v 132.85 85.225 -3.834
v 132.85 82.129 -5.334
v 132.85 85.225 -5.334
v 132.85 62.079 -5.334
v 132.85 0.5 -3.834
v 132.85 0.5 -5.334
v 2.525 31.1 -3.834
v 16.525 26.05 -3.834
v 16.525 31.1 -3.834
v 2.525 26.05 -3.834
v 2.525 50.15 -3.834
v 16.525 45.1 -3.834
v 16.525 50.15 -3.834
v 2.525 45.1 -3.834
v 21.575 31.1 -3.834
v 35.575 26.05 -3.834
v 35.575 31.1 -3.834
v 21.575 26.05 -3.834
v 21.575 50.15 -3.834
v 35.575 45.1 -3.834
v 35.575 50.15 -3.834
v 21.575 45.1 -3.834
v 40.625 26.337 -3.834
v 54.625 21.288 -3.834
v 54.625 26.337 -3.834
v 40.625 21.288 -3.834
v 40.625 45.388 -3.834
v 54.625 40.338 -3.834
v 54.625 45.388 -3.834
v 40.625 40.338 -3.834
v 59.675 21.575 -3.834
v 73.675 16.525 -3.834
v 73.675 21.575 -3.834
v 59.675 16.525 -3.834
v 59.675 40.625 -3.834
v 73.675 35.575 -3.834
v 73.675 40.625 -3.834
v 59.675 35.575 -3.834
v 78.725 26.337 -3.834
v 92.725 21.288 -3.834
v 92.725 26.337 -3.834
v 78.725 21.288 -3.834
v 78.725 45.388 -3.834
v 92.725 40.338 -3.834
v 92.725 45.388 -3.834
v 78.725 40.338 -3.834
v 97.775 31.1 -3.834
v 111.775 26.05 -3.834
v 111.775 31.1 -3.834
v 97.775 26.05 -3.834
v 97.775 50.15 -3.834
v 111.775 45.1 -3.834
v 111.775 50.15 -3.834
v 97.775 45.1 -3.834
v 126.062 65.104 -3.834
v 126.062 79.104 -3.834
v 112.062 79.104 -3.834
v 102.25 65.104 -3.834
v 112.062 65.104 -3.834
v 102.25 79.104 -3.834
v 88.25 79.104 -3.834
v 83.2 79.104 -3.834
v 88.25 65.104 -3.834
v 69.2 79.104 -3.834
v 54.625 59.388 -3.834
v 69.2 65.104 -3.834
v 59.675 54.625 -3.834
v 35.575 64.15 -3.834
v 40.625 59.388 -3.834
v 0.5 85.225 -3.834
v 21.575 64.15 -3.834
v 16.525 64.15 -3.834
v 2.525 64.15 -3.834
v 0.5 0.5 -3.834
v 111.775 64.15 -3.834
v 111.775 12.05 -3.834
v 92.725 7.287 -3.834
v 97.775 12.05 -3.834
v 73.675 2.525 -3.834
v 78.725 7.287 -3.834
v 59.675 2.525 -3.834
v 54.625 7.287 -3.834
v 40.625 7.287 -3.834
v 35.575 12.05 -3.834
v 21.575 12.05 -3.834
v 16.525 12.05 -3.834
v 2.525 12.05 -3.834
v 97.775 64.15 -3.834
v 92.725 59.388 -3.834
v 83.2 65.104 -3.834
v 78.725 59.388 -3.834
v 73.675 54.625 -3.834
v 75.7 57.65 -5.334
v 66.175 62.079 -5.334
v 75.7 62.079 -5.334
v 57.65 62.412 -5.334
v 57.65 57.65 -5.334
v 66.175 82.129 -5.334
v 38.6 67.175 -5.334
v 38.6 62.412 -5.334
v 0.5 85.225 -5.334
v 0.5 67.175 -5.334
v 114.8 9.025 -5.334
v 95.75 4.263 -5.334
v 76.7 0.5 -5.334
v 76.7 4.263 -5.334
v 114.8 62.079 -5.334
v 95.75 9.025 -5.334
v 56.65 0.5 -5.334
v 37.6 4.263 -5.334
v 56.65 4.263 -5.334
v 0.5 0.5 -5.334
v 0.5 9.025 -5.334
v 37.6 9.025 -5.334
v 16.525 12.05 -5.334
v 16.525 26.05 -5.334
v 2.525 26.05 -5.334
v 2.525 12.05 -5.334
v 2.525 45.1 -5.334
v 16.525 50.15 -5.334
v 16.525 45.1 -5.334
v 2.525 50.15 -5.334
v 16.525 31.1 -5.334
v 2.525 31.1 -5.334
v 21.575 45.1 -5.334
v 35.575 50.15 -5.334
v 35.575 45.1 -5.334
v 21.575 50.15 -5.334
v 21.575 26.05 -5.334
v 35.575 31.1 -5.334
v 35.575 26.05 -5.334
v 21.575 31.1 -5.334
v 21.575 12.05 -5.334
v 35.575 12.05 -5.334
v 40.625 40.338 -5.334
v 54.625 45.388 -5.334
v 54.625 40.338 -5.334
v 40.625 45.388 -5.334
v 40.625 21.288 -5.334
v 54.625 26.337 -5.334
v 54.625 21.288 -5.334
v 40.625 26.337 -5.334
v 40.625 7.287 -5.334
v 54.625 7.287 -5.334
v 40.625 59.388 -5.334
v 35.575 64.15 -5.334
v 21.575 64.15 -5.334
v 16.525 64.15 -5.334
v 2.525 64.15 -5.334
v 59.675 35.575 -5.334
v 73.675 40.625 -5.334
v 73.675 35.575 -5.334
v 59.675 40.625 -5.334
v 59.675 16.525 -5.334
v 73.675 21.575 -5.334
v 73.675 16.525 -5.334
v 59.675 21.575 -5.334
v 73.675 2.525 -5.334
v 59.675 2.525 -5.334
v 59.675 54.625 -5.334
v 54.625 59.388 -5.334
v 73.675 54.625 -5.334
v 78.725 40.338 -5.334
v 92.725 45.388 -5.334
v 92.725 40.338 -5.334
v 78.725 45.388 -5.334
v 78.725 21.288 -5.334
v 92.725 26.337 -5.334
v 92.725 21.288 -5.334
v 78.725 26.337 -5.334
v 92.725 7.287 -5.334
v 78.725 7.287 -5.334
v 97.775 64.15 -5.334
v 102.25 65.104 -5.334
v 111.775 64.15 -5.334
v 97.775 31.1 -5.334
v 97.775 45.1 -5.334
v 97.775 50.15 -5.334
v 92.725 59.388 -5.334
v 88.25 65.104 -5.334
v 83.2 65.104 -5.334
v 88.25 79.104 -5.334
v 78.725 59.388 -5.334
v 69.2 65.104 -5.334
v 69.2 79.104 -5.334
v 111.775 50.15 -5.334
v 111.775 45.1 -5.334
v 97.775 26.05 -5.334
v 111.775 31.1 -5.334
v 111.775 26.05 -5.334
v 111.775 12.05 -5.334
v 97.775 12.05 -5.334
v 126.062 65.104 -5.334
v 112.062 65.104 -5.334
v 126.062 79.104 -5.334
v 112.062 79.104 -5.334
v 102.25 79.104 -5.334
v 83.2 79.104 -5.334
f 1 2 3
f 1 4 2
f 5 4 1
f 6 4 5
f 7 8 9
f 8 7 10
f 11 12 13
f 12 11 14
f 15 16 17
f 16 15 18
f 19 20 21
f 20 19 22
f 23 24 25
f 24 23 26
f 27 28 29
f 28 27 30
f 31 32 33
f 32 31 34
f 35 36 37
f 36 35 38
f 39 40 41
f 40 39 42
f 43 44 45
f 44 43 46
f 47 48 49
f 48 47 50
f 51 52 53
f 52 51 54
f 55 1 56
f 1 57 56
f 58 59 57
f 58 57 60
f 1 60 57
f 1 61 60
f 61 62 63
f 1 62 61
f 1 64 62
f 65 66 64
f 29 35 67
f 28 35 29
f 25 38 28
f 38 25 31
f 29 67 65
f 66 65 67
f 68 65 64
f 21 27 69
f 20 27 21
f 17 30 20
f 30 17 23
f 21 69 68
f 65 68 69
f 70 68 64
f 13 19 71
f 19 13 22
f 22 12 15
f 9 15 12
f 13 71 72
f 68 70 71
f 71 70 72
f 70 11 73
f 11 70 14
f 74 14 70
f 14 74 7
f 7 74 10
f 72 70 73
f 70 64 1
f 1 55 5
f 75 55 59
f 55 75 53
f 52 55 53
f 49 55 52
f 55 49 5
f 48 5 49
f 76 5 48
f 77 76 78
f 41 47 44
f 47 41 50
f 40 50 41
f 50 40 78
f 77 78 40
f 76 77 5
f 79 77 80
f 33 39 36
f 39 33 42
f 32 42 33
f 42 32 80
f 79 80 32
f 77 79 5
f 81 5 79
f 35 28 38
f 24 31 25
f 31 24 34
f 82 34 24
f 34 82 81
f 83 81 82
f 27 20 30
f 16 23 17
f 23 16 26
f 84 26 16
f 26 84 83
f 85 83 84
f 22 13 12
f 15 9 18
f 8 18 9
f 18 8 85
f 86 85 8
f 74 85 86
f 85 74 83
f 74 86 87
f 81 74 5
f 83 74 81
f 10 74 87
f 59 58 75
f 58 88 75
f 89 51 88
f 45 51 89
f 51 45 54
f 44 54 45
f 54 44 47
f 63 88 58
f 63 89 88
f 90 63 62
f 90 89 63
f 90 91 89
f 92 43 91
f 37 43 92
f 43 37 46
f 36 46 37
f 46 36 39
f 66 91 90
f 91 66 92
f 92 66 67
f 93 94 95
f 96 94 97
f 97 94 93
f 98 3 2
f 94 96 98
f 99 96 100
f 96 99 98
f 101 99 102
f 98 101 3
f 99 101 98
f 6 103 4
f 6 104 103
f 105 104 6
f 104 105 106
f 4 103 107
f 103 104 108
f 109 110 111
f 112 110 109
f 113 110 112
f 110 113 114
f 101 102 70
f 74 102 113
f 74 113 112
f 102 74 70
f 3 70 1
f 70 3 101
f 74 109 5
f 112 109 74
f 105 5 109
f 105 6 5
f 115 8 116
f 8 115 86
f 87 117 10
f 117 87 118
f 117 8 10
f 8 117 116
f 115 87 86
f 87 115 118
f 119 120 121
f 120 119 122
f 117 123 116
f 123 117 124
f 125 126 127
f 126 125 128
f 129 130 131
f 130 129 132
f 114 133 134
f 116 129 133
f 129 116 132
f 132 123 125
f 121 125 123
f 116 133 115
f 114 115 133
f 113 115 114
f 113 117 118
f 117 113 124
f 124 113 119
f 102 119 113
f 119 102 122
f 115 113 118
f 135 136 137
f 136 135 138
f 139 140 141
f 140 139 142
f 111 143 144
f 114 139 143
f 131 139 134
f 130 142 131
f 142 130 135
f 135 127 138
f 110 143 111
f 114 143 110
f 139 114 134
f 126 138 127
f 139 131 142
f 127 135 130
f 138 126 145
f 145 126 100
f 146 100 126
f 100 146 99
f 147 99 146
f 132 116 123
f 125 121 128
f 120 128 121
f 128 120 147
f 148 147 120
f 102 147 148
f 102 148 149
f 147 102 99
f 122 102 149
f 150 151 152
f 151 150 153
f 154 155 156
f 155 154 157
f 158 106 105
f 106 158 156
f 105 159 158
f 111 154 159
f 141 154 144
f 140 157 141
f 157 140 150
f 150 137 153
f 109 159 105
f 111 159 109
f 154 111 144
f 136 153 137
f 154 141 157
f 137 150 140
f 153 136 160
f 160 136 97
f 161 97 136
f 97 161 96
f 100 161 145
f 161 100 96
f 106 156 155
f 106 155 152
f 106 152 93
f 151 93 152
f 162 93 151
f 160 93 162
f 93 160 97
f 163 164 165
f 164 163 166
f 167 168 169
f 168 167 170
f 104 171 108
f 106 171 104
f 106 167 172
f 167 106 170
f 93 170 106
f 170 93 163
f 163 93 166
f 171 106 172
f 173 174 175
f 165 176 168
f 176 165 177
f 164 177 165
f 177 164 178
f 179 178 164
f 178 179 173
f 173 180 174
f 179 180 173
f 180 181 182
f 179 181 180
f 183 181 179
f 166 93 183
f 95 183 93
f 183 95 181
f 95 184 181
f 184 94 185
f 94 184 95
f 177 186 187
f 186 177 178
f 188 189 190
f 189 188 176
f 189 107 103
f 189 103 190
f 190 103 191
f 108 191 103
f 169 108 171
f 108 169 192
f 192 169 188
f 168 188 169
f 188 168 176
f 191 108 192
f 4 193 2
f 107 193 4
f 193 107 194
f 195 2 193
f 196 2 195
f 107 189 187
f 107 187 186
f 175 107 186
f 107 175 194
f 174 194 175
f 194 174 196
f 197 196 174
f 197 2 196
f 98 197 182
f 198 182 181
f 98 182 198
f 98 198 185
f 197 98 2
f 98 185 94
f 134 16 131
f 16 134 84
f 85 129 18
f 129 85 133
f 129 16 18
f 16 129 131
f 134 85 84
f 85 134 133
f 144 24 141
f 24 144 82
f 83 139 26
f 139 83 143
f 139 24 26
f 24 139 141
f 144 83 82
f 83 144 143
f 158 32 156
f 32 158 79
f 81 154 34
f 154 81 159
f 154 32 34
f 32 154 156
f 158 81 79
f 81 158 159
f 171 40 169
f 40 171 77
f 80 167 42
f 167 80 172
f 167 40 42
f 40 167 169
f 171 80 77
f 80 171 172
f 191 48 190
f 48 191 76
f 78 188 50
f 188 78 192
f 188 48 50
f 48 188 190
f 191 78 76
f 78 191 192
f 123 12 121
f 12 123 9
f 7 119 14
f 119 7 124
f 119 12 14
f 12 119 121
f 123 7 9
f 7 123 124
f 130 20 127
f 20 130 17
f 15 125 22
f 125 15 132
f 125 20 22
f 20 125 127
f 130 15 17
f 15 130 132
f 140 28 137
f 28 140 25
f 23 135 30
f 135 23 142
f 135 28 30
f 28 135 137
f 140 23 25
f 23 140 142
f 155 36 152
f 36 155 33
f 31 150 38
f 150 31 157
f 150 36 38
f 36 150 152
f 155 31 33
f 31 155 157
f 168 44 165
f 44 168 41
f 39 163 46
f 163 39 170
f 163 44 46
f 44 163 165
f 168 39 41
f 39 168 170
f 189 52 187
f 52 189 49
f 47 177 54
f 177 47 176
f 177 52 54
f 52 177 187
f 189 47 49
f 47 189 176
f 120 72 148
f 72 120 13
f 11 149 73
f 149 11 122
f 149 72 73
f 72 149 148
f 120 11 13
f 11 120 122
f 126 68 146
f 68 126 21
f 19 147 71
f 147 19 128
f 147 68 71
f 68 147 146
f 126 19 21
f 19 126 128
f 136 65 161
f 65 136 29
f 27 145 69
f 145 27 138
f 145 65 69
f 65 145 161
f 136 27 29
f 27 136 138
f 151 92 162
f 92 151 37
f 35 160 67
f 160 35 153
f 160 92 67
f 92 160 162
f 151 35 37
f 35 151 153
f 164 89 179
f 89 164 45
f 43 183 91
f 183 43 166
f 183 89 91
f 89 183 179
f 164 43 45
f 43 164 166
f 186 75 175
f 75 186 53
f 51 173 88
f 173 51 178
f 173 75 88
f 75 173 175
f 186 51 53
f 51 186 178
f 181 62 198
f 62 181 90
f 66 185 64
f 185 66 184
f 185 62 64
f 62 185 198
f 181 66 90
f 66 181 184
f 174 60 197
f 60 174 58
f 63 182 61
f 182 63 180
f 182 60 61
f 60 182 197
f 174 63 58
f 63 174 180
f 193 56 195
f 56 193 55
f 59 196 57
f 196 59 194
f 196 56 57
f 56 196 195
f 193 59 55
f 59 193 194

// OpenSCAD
// file: ../lib/circuits/helpers.scad
function bu(u) = u * 2.54;

module breadboard_row(number, orientation="vertical") {
  children();
  if(number > 1) {
    if(orientation == "vertical") {
      translate([0,bu(1),0])
        breadboard_row(number-1, orientation=orientation) {
          children();
        }
    } else {
      translate([bu(1),0,0])
        breadboard_row(number-1, orientation=orientation){
          children();
        }
    }
  }
}
// file: ../lib/switches/rgb.scad
include <../variables.scad>

module rgb_row_trace_connection(width, height, xpos, ypos, rgb, connections) {
  half_width = u_mm(width)/2;
  half_height = u_mm(height)/2;
  if(connections[3] == "connect") {
    translate([1-half_width,8.875,0]){
      circle(d=0.8,$fn=40);
      offset(0.4)
        polygon(points=[[0,-0.01],[0,0.01],[u_mm(-xpos)-2, u_mm(-ypos)+0.01],[u_mm(-xpos)-2, u_mm(-ypos)-0.01]]);
    }
    translate([1-half_width,4.9,0]){
      circle(d=0.8,$fn=40);
      offset(0.4)
        polygon(points=[[0,-0.01],[0,0.01],[u_mm(-xpos)-2, u_mm(-ypos)+0.01],[u_mm(-xpos)-2, u_mm(-ypos)-0.01]]);
    }
    translate([1-half_width,3.3,0]){
      circle(d=0.8,$fn=40);
      offset(0.4)
        polygon(points=[[0,-0.01],[0,0.01],[u_mm(-xpos)-2, u_mm(-ypos)+0.01],[u_mm(-xpos)-2, u_mm(-ypos)-0.01]]);
    }
  }
  if(connections[2] == "connect") {
    translate([half_width-1,8.875,0]) {
      circle(d=0.8,$fn=40);
    }
    translate([half_width-1,4.9,0]) {
      circle(d=0.8,$fn=40);
    }
    translate([half_width-1,3.3,0]){
      circle(d=0.8,$fn=40);
    }
  }
}

module rgb_pcb_drill(width=1, height=1, rgb=true, connections=["hole","hole","hole","hole"]) {
  half_width = u_mm(width)/2;
  half_height = u_mm(height)/2;
  translate([half_width,half_height,0]) {
    if(rgb == true) {
      // LED Hole
      translate([-1.875,3.4])
        square([3.75,3]);

      // LED D
      if(connections[3] == "hole")
        translate([1.3-half_width,8,0])
          circle(d=1,$fn=40);
      if(connections[2] == "hole")
        translate([half_width-1.3,8,0])
          circle(d=1,$fn=40);

      // LED G
      if(connections[3] == "hole")
        translate([1.3-half_width,5.4,0])
          circle(d=1,$fn=40);
      if(connections[2] == "hole")
        translate([half_width-1.3,5.4,0])
          circle(d=1,$fn=40);

      // LED V
      if(connections[3] == "hole")
        translate([1.3-half_width,2.8,0])
          circle(d=1,$fn=40);
      if(connections[2] == "hole")
        translate([half_width-1.3,2.8,0])
          circle(d=1,$fn=40);
    }

    children();
  }
}

module rgb_pcb_hole_traces(width=1, height=1, rgb=true, xpos=0, ypos=0, connections=["hole","hole","hole","hole"]) {
  half_width = u_mm(width)/2;
  half_height = u_mm(height)/2;
  translate([half_width,half_height,0]) {
    if(rgb == true) {
      // LED D
      if(connections[3] == "hole")
        translate([1.3-half_width,8,0])
          circle(d=2.5,$fn=40);
      if(connections[2] == "hole")
        translate([half_width-1.3,8,0])
          circle(d=2.5,$fn=40);

      // LED G
      if(connections[3] == "hole")
        translate([1.3-half_width,5.4,0])
          circle(d=2.5,$fn=40);
      if(connections[2] == "hole")
        translate([half_width-1.3,5.4,0])
          circle(d=2.5,$fn=40);

      // LED V
      if(connections[3] == "hole")
        translate([1.3-half_width,2.8,0])
          circle(d=2.5,$fn=40);
      if(connections[2] == "hole")
        translate([half_width-1.3,2.8,0])
          circle(d=2.5,$fn=40);
    }

    children();
  }
}

module rgb_pcb_traces(width=1, height=1, rgb=true, xpos=0, ypos=0, connections=["hole","hole","hole","hole"]) {
  half_width = u_mm(width)/2;
  half_height = u_mm(height)/2;
  rgb_pcb_hole_traces(width=width, height=height, rgb=rgb, connections=connections) {
    if(rgb == true) {
      rgb_row_trace_connection(width=width, height=height, xpos=xpos, ypos=ypos, rgb=rgb, connections=connections);
      v_left = connections[3] == "none" ? 1 : half_width-5;
      // LED G
      translate([1.25,5])
        square([2,2]);
      translate([2.7,8.5,0]) {
        length = connections[2] == "none" ? 2 : half_width-3.7; 
        square([length,0.75]);
      }
      translate([2.7,6.8])
        square([0.8,2.4]);
      translate([-3.5,6.2])
        square([7,0.8]);
      translate([-3.5,6.8])
        square([0.8,2.4]);
      translate([-4-v_left,8.5,0])
        square([v_left+1,0.75]);

      // LED D
      translate([-4-v_left,4.5,0])
        square([v_left,0.8]);
      translate([-4.5,4.5,0])
        square([0.8,1.3]);
      translate([-4.5,5,0])
        square([1.3,0.8]);
      translate([2,4,0])
        square([2,0.8]);
      translate([4,4,0])
        square([0.8,1.3]);
      translate([4,4.5,0]) {
        length = connections[2] == "none" ? 0 : half_width-5; 
        square([length,0.75]);
      }
      translate([-3.375,5])
        square([2,1.1]);
      translate([1.25,3.75])
        square([2,1.1]);

      // LED V
      v_right = connections[2] == "none" ? 0 : half_width-5.25;
      translate([-4-v_left,2.9,0])
        square([v_right+v_left+8.875,0.8]);
      translate([-3.375,3.5])
        square([2,1.35]);
    }

    children();
  }
}
// file: ../lib/switches/base.scad
include <../variables.scad>
include <rgb.scad>

// ["top", "bottom", "left", "right"]

module switch_row_trace_connection(width, height, xpos, ypos, rgb, connections) {
  half_width = u_mm(width)/2;
  half_height = u_mm(height)/2;
  if(connections[3] == "connect") {
    translate([1-half_width,-5.5,0]){
      circle(d=0.8,$fn=40);
      offset(0.4)
        polygon(points=[[0,-0.01],[0,0.01],[u_mm(-xpos)-2, u_mm(-ypos)+0.01],[u_mm(-xpos)-2, u_mm(-ypos)-0.01]]);
    }
  }
  if(connections[2] == "connect") {
    translate([half_width-1,-5.5,0]) {
      circle(d=0.8,$fn=40);
    }
  }
}

module switch_column_trace_connection(width, height, xpos, ypos, rgb, connections, last_xpos=0, last_ypos=0) {
  half_width = u_mm(width)/2;
  half_height = u_mm(height)/2;
  if(connections[1] == "connect") {
    translate([-u_mm((width-1)/2)-0.9,half_height-1,0]) {
      circle(d=0.8,$fn=40);
      offset(0.4)
        polygon(points=[[0,-0.01],[0,0.01],[u_mm((width-1)/2),0.01],[u_mm((width-1)/2),-0.01]]);
    }
  }
  if(connections[0] == "connect") {
    y_off = u_mm(ypos-last_ypos);
    x_off = u_mm(last_xpos-xpos);
    translate([-0.875,-1-y_off-half_height,0]) {
      offset(0.4)
        polygon(points=[[-0.01+x_off,0],[0.01+x_off,0],[0.01,2+y_off],[-0.01,2+y_off]]);
      translate([x_off-0.01,0]) {
        offset(0.4)
          polygon(points=[[0,-0.01],[0,0.01],[u_mm((width-1)/2)+1,0.01],[u_mm((width-1)/2)+1,-0.01]]);
      }
    }
  }
}

module switch_base_pcb_drill(width=1, height=1, rgb=true, single=true, connections=["hole","hole","hole","hole"]) {
  half_width = u_mm(width)/2;
  half_height = u_mm(height)/2;
  rgb_pcb_drill(width=width, height=height, rgb=rgb, connections=connections) {
    // Row
    if(connections[2] == "hole")
      translate([half_width-1.3,-5.5,0])
        circle(d=1,$fn=40);
    if(connections[3] == "hole")
      translate([1.3-half_width,-5.5,0])
        circle(d=1,$fn=40);

    // Column
    if(connections[1] == "hole")
      translate([-1,half_height-1.25,0])
        circle(d=1,$fn=40);
    if(connections[0] == "hole")
      translate([-1,1.25-half_height,0])
        circle(d=1,$fn=40);

    children();
  }
}

module switch_base_pcb_traces(width=1, height=1, rgb=true, xpos=0, ypos=0, connections=["hole","hole","hole","hole"], last_xpos=0, last_ypos=0, single=true) {
  half_width = u_mm(width)/2;
  half_height = u_mm(height)/2;
  rgb_pcb_traces(width=width, height=height, rgb=rgb, xpos=xpos, ypos=ypos, connections=connections) {
    switch_row_trace_connection(width, height, xpos, ypos, rgb, connections);
    if(single && !rgb)
      switch_column_trace_connection(width, height, xpos, ypos, rgb, connections, last_xpos=last_xpos, last_ypos=last_ypos);

    // Row
    if(connections[2] == "hole")
      translate([half_width-1.3,-5.5,0])
        circle(d=2.5,$fn=40);
    if(connections[3] == "hole")
      translate([1.3-half_width,-5.5,0])
        circle(d=2.5,$fn=40);

    // Column
    if(connections[1] == "hole")
      translate([-1,half_height-1.25,0])
        circle(d=2.4,$fn=40);
    if(connections[0] == "hole")
      translate([-1,1.25-half_height,0])
        circle(d=2.4,$fn=40);

    children();
  }
}

module switch_base_pcb_traces_bottom(width=1, height=1, rgb=true, xpos=0, ypos=0, connections=["hole","hole","hole","hole"], last_xpos=0, last_ypos=0) {
  half_width = u_mm(width)/2;
  half_height = u_mm(height)/2;
  rgb_pcb_hole_traces(width=width, height=height, rgb=rgb, connections=connections) {
    switch_column_trace_connection(width, height, xpos, ypos, rgb, connections, last_xpos=last_xpos, last_ypos=last_ypos);

    // Row
    if(connections[2] == "hole")
      translate([half_width-1.3,-5.5,0])
        circle(d=2.5,$fn=40);
    if(connections[3] == "hole")
      translate([1.3-half_width,-5.5,0])
        circle(d=2.5,$fn=40);

    // Column
    if(connections[1] == "hole")
      translate([-1,half_height-1.25,0])
        circle(d=2.5,$fn=40);
    if(connections[0] == "hole")
      translate([-1,1.25-half_height,0])
        circle(d=2.5,$fn=40);

    children();
  }
}
// file: ../lib/switches/footprints.scad
include <../variables.scad>
include <stabilizers.scad>

module pcb_switch_outline(width=1, height=1) {
  stab_extra = width >= 2 ? 2 : 0;
  translate([0,-stab_extra])
    square([u_mm(width)+0.01, u_mm(height)+0.01+stab_extra]);
}

module pcb_switch_space_outline(width=1, height=1, style="mx", cnc=false) {
  offset = height_for_style(style);
  stab_extra = width >= 2 ? 2 : 0;
  translate([-1,-1-stab_extra,2.834-offset])
    cube([u_mm(width) + 2, u_mm(height) + 2 + stab_extra, 1.166+offset]);
  translate([u_mm(width/2),u_mm(height/2)]) {
    translate([-7.5,-7.5,1.5-offset])
      cube([15,15,5]);
    translate([-7,-7,-10])
      cube([14,14,10]);
    translate([u_mm(-width/2)-0.5,u_mm(-height/2)-0.5,-20-offset])
      cube([u_mm(width)+1,u_mm(height)+1, 20]);
  }
  translate([hole_offset(width), hole_offset(height),-10])
    stab(width);
}
// file: ../lib/switches/stabilizers.scad
module stab_hole_render(distance){
  translate([14+distance+3.375,6.99,0]) {
    circle(d=3.175, $fn=40);
    translate([0,-15.24,0])
      circle(d=4.064, $fn=40);
  }
  translate([-6.75-distance+3.375,6.99,0]) {
    circle(d=3.175, $fn=40);
    translate([0,-15.24,0])
      circle(d=4.064, $fn=40);
  }
}

module stab_holes(width) {
  if (width >= 7) {
    stab_hole_render(39.6);
  } else if (width >= 6) {
    stab_hole_render(39.6);
  } else if(width >= 2) {
    stab_hole_render(1.6);
  }
}

module stab_render(distance, cnc=false, height=5.334) {
  translate([14+distance,1.47,0]){
    // Right Side Large Hole
    cube([6.75,12.3,10]);

    // Add 1/16" corner holes for milling
    if(cnc){
      translate([0.56,0.56,0])
        cylinder(h=10,d=1.59,$fn=20);
      translate([6.75-0.56,0.56,0])
        cylinder(h=10,d=1.59,$fn=20);
      translate([0.56,12.3-0.56,0])
        cylinder(h=10,d=1.59,$fn=20);
      translate([6.75-0.56,12.3-0.56,0])
        cylinder(h=10,d=1.59,$fn=20);
    }
    translate([5.75,3.23,0]){
      // Side hole for notch
      cube([1.825,3.175,10]);
      translate([1.825,1.59,0])
        if(cnc)
          resize([1.59,3.175,10])
            cylinder(h=10,d=1.59,$fn=20);
    }
    translate([1.725,11.3,0]){
      // Top Notch
      cube([3.3,2.2,10]);
      if(cnc)
        translate([1.65,2.2,0])
          resize([3.3,1,10])
            cylinder(h=10,d=1,$fn=20);
    }
    // Thin out for clip
    translate([-1,-1,10-height+1.5])
      cube([8.75,14.3,height-1.5]);
  }
  translate([-6.75-distance,1.47,0]){
    // Left Side Large Hole
    cube([6.75,12.3,10]);
    translate([-0.825,3.23,0]){
      // Side hole for notch
      cube([1.825,3.175,10]);
      if(cnc)
        translate([0,1.59,0])
          resize([1.59,3.175,10])
            cylinder(h=10,d=1.59,$fn=20);

    }
    translate([1.725,11.3,0]){
      // Top Notch
      cube([3.3,2.2,10]);
      if(cnc)
        translate([1.65,2.2,0])
          resize([3.3,1,10])
            cylinder(h=10,d=1,$fn=20);
    }
    if(cnc){
      translate([0.56,0.56,0])
        cylinder(h=10,d=1.59,$fn=20);
      translate([6.75-0.56,0.56,0])
        cylinder(h=10,d=1.59,$fn=20);
      translate([0.56,12.3-0.56,0])
        cylinder(h=10,d=1.59,$fn=20);
      translate([6.75-0.56,12.3-0.56,0])
        cylinder(h=10,d=1.59,$fn=20);
    }
    // Thin out for clip
    translate([-1,-1,10-height+1.5])
      cube([8.75,14.3,height-1.5]);
  }
  // Center shaft for bar
  translate([-distance-2,4.7,0]){
    cube([distance*2+20,4.6,10]);
  }
}

module stab(key_width, cnc=false) {
  if (key_width >= 7) {
    stab_render(39.6, cnc=cnc);
  } else if (key_width >= 6) {
    stab_render(39.6, cnc=cnc);
  } else if(key_width >= 2) {
    stab_render(1.6, cnc=cnc);
  }
}
// file: ../lib/circuits/wire.scad
module guage(guage=12) {
  fn=20;
  if(guage == 8) {
    circle(d=3.25, $fn=fn);
  } else if (guage == 10) {
    circle(d=2.59, $fn=fn);
  } else if (guage == 12) {
    circle(d=2.06, $fn=fn);
  } else if (guage == 14) {
    circle(d=1.57, $fn=fn);
  } else if (guage == 16) {
    circle(d=1.3, $fn=fn);
  }
}

module wire_pcb_drill(guage=12) {
  offset(0.1)
    guage(guage);
}

module wire_pcb_traces(guage=12) {
  offset(0.75)
    guage(guage);
}

module wire_pcb_outline(guage=12) {
  offset(1.5)
    guage(guage);
}

module wire_space_outline(guage=12) {
  linear_extrude(10)
    offset(0.1)
      guage(guage);
}
// file: ../lib/circuits/trrs.scad
module trrs_post(d=1.2) {
  translate([0,-d/4,0]) {
    circle(d=d, $fn=20);
    translate([-d/2,0,0]) {
      square([d,(d/2-.2)]);
    }
    translate([0,(d/2-.2),0]) {
      circle(d=d, $fn=20);
    }
  }
}

module trrs_pcb_drill(side="left") {
  translate([2.8,1.5]) {
    circle(d=2, $fn=20);
  }
  translate([2.8,8.5]) {
    circle(d=2, $fn=20);
  }
  translate([0.5,11.3,0]) {
    trrs_post();
  }
  translate([5.1,3.2,0]) {
    trrs_post();
  }
  translate([5.1,6.2,0]) {
    trrs_post();
  }
  translate([5.1,10.2,0]) {
    trrs_post();
  }
  if(side != "none"){
    offset = side == "left" ? 7.6 : -2;
    translate([offset,11.3]) {
      circle(d=1.2, $fn=20);
    }
    translate([offset,8.3]) {
      circle(d=1.2, $fn=20);
    }
    translate([offset,5.3]) {
      circle(d=1.2, $fn=20);
    }
    translate([offset,2.2]) {
      circle(d=1.2, $fn=20);
    }
  }
}

module trrs_pcb_traces(side="left") {
  translate([-1,9.7,0]){
    difference() {
      square([3,3]);
      if(side == "right") {
        translate([3,-1.8]) {
          rotate(45) {
            square(2);
          }
        }
      }
    }
  }
  translate([3.6,1.2,0]){
    difference() {
      square([3,3.5]);
      if(side == "left") {
        translate([3,2.3]) {
          rotate(45) {
            square(2);
          }
        }
      }
    }
  }
  translate([3.6,4.8,0]){
    difference() {
        square([3,3.5]);
        if(side == "left") {
          translate([3,2.3]) {
            rotate(45) {
              square(2);
            }
          }
        }
    }
  }
  translate([3.6,8.4,0]){
    difference() {
      square([3,3.2]);
      if(side == "left") {
        translate([3,1.8]) {
          rotate(45) {
            square(2);
          }
        }
      }
    }
  }
  if(side != "none"){
    translate([side == "left" ? 7.6 : -2,0,0]){
      translate([0,11.3]) {
        circle(d=3, $fn=20);
      }
      translate([0,8.3]) {
        circle(d=2.9, $fn=20);
      }
      translate([0,5.3]) {
        circle(d=3, $fn=20);
      }
      translate([0,2.2]) {
        circle(d=3, $fn=20);
      }
    }
    translate([side == "left" ? 5.6 : -2,0,0]){
      left_trace = side == "left" ? 2.5 : 7.6;
      translate([0,2.2]) {
        square([left_trace,1.5]);
      }
      translate([0,5.1]) {
        square([left_trace,1.5]);
      }
      if(side == "left") {
        translate([0,8.7]) {
          square([left_trace,0.9]);
        }
      }
      else {
        translate([0,8]) {
          square([4,1.6]);
        }
        translate([4,9]) {
          square([4,1.6]);
        }
        translate([2.8,9.4]) {
          rotate(-45) {
            square([1,1.7]);
          }
        }
      }
    }
    translate([side == "left" ? 0.5 : -2,0,0]){
      right_trace = side == "left" ? 7.1 : 2;
      translate([0,11.7]) {
        square([right_trace,1.3]);
      }
      translate([0,12]) {
        circle(1, $fn=20);
      }
      translate([right_trace,11.8]) {
        circle(1, $fn=20);
      }
    }
  }
}

module trrs_pcb_outline(side="left") {
  translate([-1,0,0]) {
    square([7.6,13.1]);
  }
  if(side != "none"){
    translate([side == "left" ? 5.6 : -3.5, 0]) {
      square([4,13.1]);
    }
  }
}

module trrs_space_outline(side="left") {
  translate([0,0,-5.3]) {
    linear_extrude(7){
      translate([-2,-1,0])
        square([9.6,15.1]);
      translate([0,-12.1,0])
        square([5.6,12.1]);
      if(side != "none")
        translate([side == "left" ? 5.6 : -4.5, -1])
          square([5,15.1]);
    }
  }
  translate([3,-2,-2.6]) {
    rotate([90,0,0]) {
      cylinder(d=10, h=30, $fn=100);
    }
  }
}
// file: ../lib/circuits/trace.scad
function vdef(vector, index) = len(vector) == index ? vector[index-1] : vector[index];
function vadd(vector, index, axis) = vdef(vector, index)[axis] > vdef(vector, index-1)[axis] ? 0.01 : -0.01;
function polygon_from_vector(vector) = 
  len(vector) > 0 ?
    concat(vector, 
      [for (i = [1:len(vector)]) 
        [vector[len(vector)-i][0]-vadd(vector, i, 0),vector[len(vector)-i][1]-vadd(vector, i, 1)]])
      : [];

function parse_loc(loc) = [
  loc[5],
  len(loc) < 7 ? "both" : loc[6],
  len(loc) < 8 ? "none" : loc[7],
];

module manual_trace_pcb_drill(location) {
  vector = parse_loc(location)[0];
  echo("holes", parse_loc(location)[2]);
  if(parse_loc(location)[2] == "holes" || parse_loc(location)[2] == "hole_begin") {
    translate(vector[0]) {
      circle(d=1, $fn=20);
    }
  }
  if(parse_loc(location)[2] == "holes" || parse_loc(location)[2] == "hole_end") {
    translate(vector[len(vector)-1]) {
      circle(d=1, $fn=20);
    }
  }
}

module manual_trace_pcb_traces(location) {
  vector = parse_loc(location)[0];
  if(parse_loc(location)[1] != "bottom") {
    offset(0.4) {
      polygon(points=polygon_from_vector(vector));
    }
  }
  if(parse_loc(location)[2] == "holes" || parse_loc(location)[2] == "hole_begin") {
    translate(vector[0]) {
      circle(d=2.5, $fn=20);
    }
  }
  if(parse_loc(location)[2] == "holes" || parse_loc(location)[2] == "hole_end") {
    translate(vector[len(vector)-1]) {
      circle(d=2.5, $fn=20);
    }
  }
}

module manual_trace_pcb_traces_bottom(location) {
  vector = parse_loc(location)[0];
  if(parse_loc(location)[1] != "top") {
    offset(0.4) {
      polygon(points=polygon_from_vector(vector));
    }
  }
  if(parse_loc(location)[2] == "holes" || parse_loc(location)[2] == "hole_begin") {
    translate(vector[0]) {
      circle(d=2.5, $fn=20);
    }
  }
  if(parse_loc(location)[2] == "holes" || parse_loc(location)[2] == "hole_end") {
    translate(vector[len(vector)-1]) {
      circle(d=2.5, $fn=20);
    }
  }
}

module manual_trace_pcb_outline(location) {
  vector = parse_loc(location)[0];
  echo("location", location);
  offset(1)
    polygon(points=polygon_from_vector(vector));

  if(parse_loc(location)[2] == "holes" || parse_loc(location)[2] == "hole_begin") {
    translate(vector[0]) {
      circle(d=4, $fn=20);
    }
  }
  if(parse_loc(location)[2] == "holes" || parse_loc(location)[2] == "hole_end") {
    translate(vector[len(vector)-1]) {
      circle(d=4, $fn=20);
    }
  }
}

module manual_trace_space_outline(location) {
  vector = parse_loc(location)[0];
  translate([0,0,-1])
    linear_extrude(2)
      offset(0.5)
        manual_trace_pcb_outline(vector);
}
// file: ../lib/circuits/support.scad
module support_pcb_drill(mm=2) {
  offset(0.1)
    circle(d=mm, $fn=20);
}

module support_pcb_traces(mm=2) {
}

module support_pcb_outline(mm=2) {
  offset(2)
    circle(d=mm, $fn=20);
}

module support_space_outline(mm=2) {
  linear_extrude(10)
    offset(0.1)
      circle(d=mm, $fn=20);
}
// file: ../lib/circuits/proton_c.scad
use <helpers.scad>

module proton_c_pcb_drill(size="full") {
  translate([bu(0.5),bu(1.5),0]) {
    translate([0,bu(1)])
      breadboard_row(4, "horizontal"){
        circle(d=1, $fn=20);
        translate([0,bu(1)])
          circle(d=1, $fn=20);
      }
    translate([bu(4),bu(1)])
      breadboard_row(2)
        circle(d=1, $fn=20);
    translate([bu(4),bu(3)])
      breadboard_row(2)
        circle(d=1, $fn=20);
    circle(d=1, $fn=20);
    translate([bu(1),0,0])
      circle(d=1, $fn=20);
    translate([bu(5),0,0])
      circle(d=1, $fn=20);
    translate([bu(6),0,0])
      circle(d=1, $fn=20);
    breadboard_row(12) {
      circle(d=1, $fn=20);
      translate([bu(1),0,0])
        circle(d=1, $fn=20);
      translate([bu(5),0,0])
        circle(d=1, $fn=20);
      translate([bu(6),0,0])
        circle(d=1, $fn=20);
    }
    if(size == "full")
      translate([0,bu(13)])
        breadboard_row(6) {
          circle(d=1, $fn=20);
          translate([bu(1),0,0])
            circle(d=1, $fn=20);
          translate([bu(5),0,0])
            circle(d=1, $fn=20);
          translate([bu(6),0,0])
            circle(d=1, $fn=20);
    }
  }
}

module proton_c_pcb_traces(size="full") {
  translate([bu(0.5),bu(1.5),0]) {
    translate([0,bu(1)])
      breadboard_row(4, "horizontal"){
        circle(d=2.4, $fn=20);
        translate([-1,0])
          square([2,bu(1)]);
        translate([0,bu(1)])
          circle(d=2.4, $fn=20);
      }
    translate([0,bu(1)])
      breadboard_row(2) {
        translate([bu(5),0])
          circle(d=2.4, $fn=20);
        translate([bu(5),-1,0])
          square([bu(1),2]);
        translate([bu(6),0,0])
          circle(d=2.4, $fn=20);
      }
    translate([bu(4),bu(1)]){
      translate([-0.75,-1])
        square([1.5,bu(2)-2]);
      breadboard_row(2)
        circle(d=2.4, $fn=20);
      translate([0,-0.75])
        square([bu(2),1.5]);
    }
    translate([bu(4),bu(3)]){
      translate([-0.75,-1])
        square([1.5,bu(2)-2]);
      breadboard_row(2)
        circle(d=2.4, $fn=20);
      translate([0,-0.75])
        square([bu(2),1.5]);
    }
    circle(d=2.4, $fn=20);
    translate([0,-1,0])
      square([bu(1),2]);
    translate([bu(1),0,0])
      circle(d=2.4, $fn=20);
    translate([bu(5),0])
      circle(d=2.4, $fn=20);
    translate([bu(5),-1,0])
      square([bu(1),2]);
    translate([bu(6),0,0])
      circle(d=2.4, $fn=20);
    translate([0,bu(3)])
      breadboard_row(9) {
        circle(d=2.4, $fn=20);
        translate([0,-1,0])
          square([bu(1),2]);
        translate([bu(1),0,0])
          circle(d=2.4, $fn=20);
        translate([bu(5),0])
          circle(d=2.4, $fn=20);
        translate([bu(5),-1,0])
          square([bu(1),2]);
        translate([bu(6),0,0])
          circle(d=2.4, $fn=20);
      }
    if(size == "full")
      translate([0,bu(13)])
        breadboard_row(6) {
          circle(d=2.4, $fn=20);
          translate([0,-1,0])
            square([bu(1),2]);
          translate([bu(1),0,0])
            circle(d=2.4, $fn=20);
          translate([bu(5),0])
            circle(d=2.4, $fn=20);
          translate([bu(5),-1,0])
            square([bu(1),2]);
          translate([bu(6),0,0])
            circle(d=2.4, $fn=20);
        }
  }
}

module proton_c_pcb_outline(size="full") {
  translate([0,bu(1)])
  square([bu(7), bu(size == "full" ? 19 : 12)]);
}

module proton_c_space_outline(size="full") {
  translate([0,0,-4]) {
    linear_extrude(6) {
      translate([-bu(0.5),-bu(0.5)])
        square([bu(8), bu(size == "full" ? 21 : 14)]);
    }
    linear_extrude(5) {
      translate([bu(0.5),-bu(15),0])
        square([bu(6),bu(25)]);
    }
  }
}
// file: ../lib/circuits/pro_micro.scad
use <helpers.scad>

module pro_micro_pcb_drill(connections="holes") {
  translate([bu(0.5),bu(1.5),0]) {
    if(connections == "holes"){
      translate([bu(3),bu(1)])
        breadboard_row(3)
          circle(d=1, $fn=20);
      translate([bu(4),bu(3)])
        breadboard_row(3)
          circle(d=1, $fn=20);
    }
    breadboard_row(12) {
      circle(d=1, $fn=20);
      if(connections == "holes") {
        translate([bu(1),0,0])
          circle(d=1, $fn=20);
        translate([bu(5),0,0])
          circle(d=1, $fn=20);
      }
      translate([bu(6),0,0])
        circle(d=1, $fn=20);
    }
  }
}

module pro_micro_pcb_traces(connections="holes") {
  translate([bu(0.5),bu(1.5),0]) {
    // GRND
    if(connections == "holes"){
      translate([bu(3),bu(1)]){
        translate([-0.75,-1])
          square([1.5,bu(3)-2]);
        breadboard_row(3)
          circle(d=2.4, $fn=20);
        translate([0,-0.75])
          square([bu(2),1.5]);
      }
      translate([bu(4),bu(3)]){
        translate([-0.75,-1])
          square([1.5,bu(3)-2]);
        breadboard_row(3)
          circle(d=2.4, $fn=20);
        translate([0,-0.75])
          square([bu(2),1.5]);
      }
    }
    breadboard_row(12) {
      circle(d=2.4, $fn=20);
      if(connections == "holes") {
        translate([0,-1,0])
          square([bu(1),2]);
        translate([bu(1),0,0])
          circle(d=2.4, $fn=20);
        translate([bu(5),0])  
          circle(d=2.4, $fn=20);
        translate([bu(5),-1,0])
          square([bu(1),2]);
      }
      translate([bu(6),0,0])
        circle(d=2.4, $fn=20);
    }
  }
}

module pro_micro_pcb_outline() {
  translate([0,bu(1)])
  square([bu(7), bu(12)]);
}

module pro_micro_space_outline() {
  translate([0,0,-4]) {
    linear_extrude(6) {
      translate([-bu(0.5),-bu(0.5)])
        square([bu(8), bu(14)]);
    }
    linear_extrude(5) {
      translate([bu(0.5),-bu(15),0])
        square([bu(6),bu(25)]);
    }
  }
}
// file: ../lib/circuits/mts_101.scad
use <../variables.scad>
module mts_101_pcb_drill() {
  translate([0,1.25]) {
    translate([2.5,0])
      square([3,1]);
    translate([1.25,0.5])
      circle(d=1,$fn=40);
    translate([6.75,0.5])
      circle(d=1,$fn=40);

    translate([2.5,4.75])
      square([3,1]);
    translate([1.25,5.25])
      circle(d=1,$fn=40);
    translate([6.75,5.25])
      circle(d=1,$fn=40);

    translate([4,10])
      circle(d=1,$fn=40);
    translate([1.25,10])
      circle(d=1,$fn=40);
    translate([6.75,10])
      circle(d=1,$fn=40);
  }
}

module mts_101_pcb_traces() {
  translate([0,1.25]) {
    translate([2,-0.5])
      square([4,2]);
    translate([1.25,0.5])
      circle(d=2,$fn=40);
    translate([6.75,0.5])
      circle(d=2,$fn=40);

    translate([2,4.25])
      square([4,2]);
    translate([1.25,5.25])
      circle(d=2,$fn=40);
    translate([6.75,5.25])
      circle(d=2,$fn=40);

    translate([4,10])
      circle(d=2,$fn=40);
    translate([1.25,9.5])
      square([6,1]);
    translate([1.25,10])
      circle(d=2,$fn=40);
    translate([6.75,10])
      circle(d=2,$fn=40);
  }
}

module mts_101_pcb_outline() {
  square([8,13]);
}

module mts_101_space_outline(, cnc=false) {
  translate([-0.5,-0.5,-10])
    cube([9,14, 14.4]);
  translate([4,6.5,-26]) {
    cylinder(d=6, h=18, $fn=30);
    cylinder(d=12, h=10, $fn=60);
  }
}
// file: ../lib/circuits/ec11.scad
use <../variables.scad>
use <../switches/base.scad>

module 1u_centered() {
  translate([u_mm(0.5),u_mm(0.5)])
    children();
}

module ec11_pcb_drill(single=false, connections=["hole","hole","hole","hole"]) {
  switch_base_pcb_drill(rgb=false, connections=connections) {
    // Key Column
    translate([-3,0,0])
      circle(d=1,$fn=40);

    // Key Row
    translate([7,2.5])
      circle(d=1, $fn=20);

    if(single) {
      translate([4.25,-3,0])
        circle(d=1, $fn=20);
      translate([-3,-3.25,0])
        circle(d=1,$fn=40);
    }
    translate([4.25,0,0])
      circle(d=1, $fn=20);

    translate([7,-2.5])
      circle(d=1, $fn=20);

    if(connections[3] == "hole"){
      translate([-5.5,2.5])
        circle(d=1, $fn=20);
      translate([-5.5,0])
        circle(d=1, $fn=20);
      translate([-5.5,-2.5])
        circle(d=1, $fn=20);
    }
    translate([-7.5,-2.5])
      circle(d=1, $fn=20);
    translate([-7.5,2.5])
      circle(d=1, $fn=20);
    translate([-7.5,0])
      circle(d=1, $fn=20);

    translate([-1.3,-6.25])
      square([2.6,1.5]);
    translate([-1.3,4.75])
      square([2.6,1.5]);
  }
}

module ec11_pcb_traces(single=false, connections=["hole","hole","hole","hole"]) {
  switch_base_pcb_traces(single=single, rgb=false, connections=connections) {
    // Key Row
    if(single){
      translate([2,2.2])
        square([4.5,0.8]);
      r_len = connections[0] != "none" ? u_mm(0.5)-1 : 6;
      l_len = connections[1] != "none" ? u_mm(0.5)-1 : 6;
      translate([2,-r_len])
        square([0.8,r_len+l_len]);
      if(connections[0] != "none")
        translate([-2,1-u_mm(0.5)])
          square([4,0.8]);
      if(connections[1] != "none")
        translate([-2.1,u_mm(0.5)-1.6])
          square([4.9,0.8]);
    }
    translate([7,2.5])
      circle(d=2.5,$fn=40);

    // Key Column
    if(connections[3] != "none")
      translate([1-u_mm(0.5),-6])
        square([u_mm(0.5)-4,1]);
    translate([-3.25,-6])
      square([0.8,5]);
    translate([-3,0])
      circle(d=2.5,$fn=40);

    if(single){
      translate([-3,-3.25])
        circle(d=2.5,$fn=40);
      translate([4.25,-3])
        circle(d=2.5,$fn=40);
    } else {
      translate([-3,-3.25])
        square([7.8,0.8]);
    }

    translate([7,-2.5])
      circle(d=2.5,$fn=40);
    translate([4.25,0]) {
      circle(d=2.5,$fn=40);
      rotate(-45)
        square([5,0.8]);
    }

    translate([4,-6])
      square([0.8,3]);
    if(connections[2] != "none")
      translate([4,-6])
        square([4.5,0.8]);

    if(connections[3] == "hole"){
      translate([-5.5,2.5])
        circle(d=2.25, $fn=20);
      translate([-5.5,0])
        circle(d=2.25, $fn=20);
      translate([-5.5,-2.5])
        circle(d=2.25, $fn=20);
    }
    translate([-7.5,-2.5])
      circle(d=2.25, $fn=20);
    translate([-7.5,2.5])
      circle(d=2.25, $fn=20);
    translate([-7.5,0])
      circle(d=2.25, $fn=20);
  }
}

module ec11_pcb_traces_bottom(connections=["hole","hole","hole","hole"]) {
  switch_base_pcb_traces_bottom(rgb=false, connections=connections) {
    // Key Row
    translate([2,2.2])
      square([4.5,0.8]);
    r_len = connections[0] != "none" ? u_mm(0.5)-1 : 6;
    l_len = connections[1] != "none" ? u_mm(0.5)-1 : 6;
    translate([2,-r_len])
      square([0.8,r_len+l_len]);
    
    if(connections[0] != "none")
      translate([-1.3,1-u_mm(0.5)])
        square([4,0.8]);
    if(connections[1] != "none")
      translate([-1,u_mm(0.5)-1.4])
        square([3.8,0.8]);
    translate([7,2.5])
      circle(d=2.5,$fn=40);

    // Key Column
    translate([-3,0])
      circle(d=2.5,$fn=40);

    translate([7,-2.5])
      circle(d=2.5,$fn=40);
    translate([4.25,0]) {
      circle(d=2.5,$fn=40);
    }

    if(connections[3] == "hole"){
      translate([-5.5,2.5])
        circle(d=2.25, $fn=20);
      translate([-5.5,0])
        circle(d=2.25, $fn=20);
      translate([-5.5,-2.5])
        circle(d=2.25, $fn=20);
    }
    translate([-7.5,-2.5])
      circle(d=2.25, $fn=20);
    translate([-7.5,2.5])
      circle(d=2.25, $fn=20);
    translate([-7.5,0])
      circle(d=2.25, $fn=20);
  }
}

module ec11_pcb_outline() {
  square([u_mm(1), u_mm(1)]);
}

module ec11_space_outline() {
  translate([-0.5,-0.5, -6])
    cube([u_mm(1)+1, u_mm(1)+1, 8]);
  1u_centered() {
    translate([0,0,-15])
      linear_extrude(15)
        circle(d=7, $fn=30);
    translate([0,0,-25])
      linear_extrude(15)
        circle(d=19, $fn=80);
  }
}
// file: ../lib/switches/choc_v1.scad
include <../variables.scad>
include <stabilizers.scad>
include <footprints.scad>

module switch_choc_v1_pcb_drill(width=1, height=1) {
  half_width = u_mm(width)/2;
  half_height = u_mm(height)/2;
  translate([half_width,half_height,0]) {
    circle(d=3.5, $fn=30);

    translate([-5.5,0])
      circle(d=2, $fn=30);
    translate([3,3.8])
      circle(d=1, $fn=30);
    translate([-4, 3.8])
      circle(d=1, $fn=30);
    translate([-4,1.25-half_height])
      circle(d=1, $fn=30);
    translate([-4, half_height-3])
      circle(d=1, $fn=30);

    translate([5.5,0])
      circle(d=2, $fn=30);
    translate([0,5.9])
      circle(d=1.3, $fn=30);
    translate([5,3.8])
      circle(d=1.3, $fn=30);
    translate([1-half_width, half_height-1])
      circle(d=1, $fn=30);
    translate([half_width-1, half_height-1])
      circle(d=1, $fn=30);
  }
}

module switch_choc_v1_pcb_traces(width=1, height=1) {
  half_width = u_mm(width)/2;
  half_height = u_mm(height)/2;
  translate([half_width,half_height,0]) {
    translate([5,3.8])
      circle(d=2.8, $fn=30);
    translate([3,3.8])
      circle(d=2.5, $fn=30);
    translate([-4, 3.8])
      circle(d=2.5, $fn=30);
    translate([-4.5, 2-half_height])
      square([1, u_mm(height)-4]);
    translate([-4,1.25-half_height])
      circle(d=2.5, $fn=30);
    translate([-4, half_height-3])
      circle(d=2.5, $fn=30);

    translate([0,5.9])
      circle(d=2.8, $fn=30);
    translate([-0.5, 5.9])
      square([1, half_height-6.9]);
    translate([1-half_width, half_height-1.5])
      square([half_width*2-2, 1]);
    translate([1-half_width, half_height-1])
      circle(d=2.5, $fn=30);
    translate([half_width-1, half_height-1])
      circle(d=2.5, $fn=30);
  }
}

module switch_choc_v1_pcb_outline(width=1, height=1) {
  pcb_switch_outline(width=width, height=height);
}
// file: ../lib/switches/mx.scad
include <../variables.scad>
include <stabilizers.scad>
include <footprints.scad>
include <base.scad>
include <rgb.scad>

module switch_mx_pcb_drill(width=1, height=1, rgb=true, single=true, connections=["hole","hole","hole","hole"]) {
  half_width = u_mm(width)/2;
  half_height = u_mm(height)/2;
  translate([hole_offset(width), half_height]) {
    stab_holes(width);
  }

  switch_base_pcb_drill(width=width, height=height, single=single, rgb=rgb, connections=connections) {
    circle(d=4,$fn=40);
    translate([-3.8,-2.5,0])
      circle(d=1.7,$fn=40);
    translate([2.5,-5,0])
      circle(d=1.7,$fn=40);
    translate([5,0,0])
      circle(d=1.75,$fn=40);
    translate([-5,0,0])
      circle(d=1.75,$fn=40);

    // Column
    translate([-1.2,-3,0])
      circle(d=1,$fn=40);
    translate([5,-2,0])
      circle(d=1,$fn=40);
    if(single){
      translate([6,-3.7,0])
        circle(d=1,$fn=40);
      if(rgb) {
        translate([5,1.7,0])
          circle(d=1,$fn=40);
      } else {
        translate([6,-8.3,0])
          circle(d=1,$fn=40);
      }
    }
  }
}

module switch_mx_pcb_traces(width=1, height=1, rgb=true, single=true, xpos=0, ypos=0, connections=["hole","hole","hole","hole"], last_xpos=0, last_ypos=0) {
  half_width = u_mm(width)/2;
  half_height = u_mm(height)/2;
  switch_base_pcb_traces(width=width, height=height, rgb=rgb, xpos=xpos, ypos=ypos, connections=connections, last_xpos=last_xpos, last_ypos=last_ypos, single=single) {
    translate([-3.8,-2.5,0])
      circle(d=4,$fn=40);
    translate([2.5,-5,0])
      circle(d=4,$fn=40);

    // Row
    v_left = connections[3] == "none" ? 1 : half_width;
    v_right = connections[2] == "none" ? 1 : half_width-5;
    translate([1-v_left,-5.9,0])
      square([v_left+v_right+3,0.8]);

    // Column
    translate([-1.2,-3,0])
      circle(d=2.5,$fn=40);
    translate([5,-2,0])
      circle(d=2.5,$fn=40);
    if(single){
      translate([6,-3.7,0])
        circle(d=2.5,$fn=40);
      difference() {
        translate([5,0,0])
          circle(d=3.55,$fn=40);
        translate([5,-2,0])
          square(4);
      }
      if(rgb) {
        translate([5,1.7,0])
          circle(d=2.3,$fn=40);
      } else {
        translate([4.2,1])
          square([0.8, half_height-2]);
        translate([-1,half_height-1.5])
          square([6,0.8]);
        translate([6,-8.3,0])
          circle(d=2.5,$fn=40);
        translate([-1.3,-8.7,0])
          square([7,0.8]);
      }
    }
  }
}

module switch_mx_pcb_traces_bottom(width=1, height=1, rgb=true, xpos=0, ypos=0, connections=["hole","hole","hole","hole"], last_xpos=0, last_ypos=0) {
  half_width = u_mm(width)/2;
  half_height = u_mm(height)/2;
  switch_base_pcb_traces_bottom(width=width, height=height, rgb=rgb, xpos=xpos, ypos=ypos, connections=connections, last_xpos=last_xpos, last_ypos=last_ypos) {
    translate([-3.8,-2.5,0])
      circle(d=4,$fn=40);
    translate([2.5,-5,0])
      circle(d=4,$fn=40);

    // Column
    translate([-1.2,-3,0])
      circle(d=2.5,$fn=40);
    translate([5,-2,0])
      circle(d=2.5,$fn=40);
    difference(){
      translate([2.5,-5,0])
        circle(d=5.9,$fn=40);
      translate([2.5,-5,0])
        circle(d=4.1,$fn=40);
      translate([0.3,-7,0])
        rotate(45)
          square(6);
    }
    translate([3.85,-3.45])
      square([0.8, 1]);

    t_height = connections[0] == "none" ? 1 : half_height-7.8;
    echo("h", 2-half_height, t_height);
    translate([-1.3,-t_height-6.8])
      square([0.8, t_height]);
    translate([-1.3,-7.2])
      square([2.2,0.8]);
    difference() {
      translate([5,0,0])
        circle(d=3.35,$fn=40);
      translate([5,-2,0])
        square(4);
    }
    b_height = connections[1] == "none" ? 2 : half_height-2;
    translate([4.2,1])
      square([0.8, b_height]);
    if(connections[1] != "none")
      translate([-1,half_height-1.5])
        square([6,0.8]);
  }
}

module switch_mx_pcb_outline(width=1, height=1) {
  pcb_switch_outline(width=width, height=height);
}
// file: ../lib/utilities.scad
function reverse(list) = len(list) > 0 ? [for (i = [1:len(list)]) list[len(list)-i]] : [];
function pop(list) = len(list) > 0 ? [for (i = [0:len(list)-1]) if (i != 0) list[i]] : [];
// file: ../lib/switches.scad
use <utilities.scad>
include <switches/mx.scad>
include <switches/choc_v1.scad>

module rotate_translate(rotation, xpos, ypos) {
  if(rotation[0] == undef || rotation[0] == 0) {
    translate([u_mm(xpos), u_mm(ypos), 0]) {
      children();
    }
  } else {
    xoff = rotation[1] == undef ? 0 : rotation[1];
    yoff = rotation[2] == undef ? 0 : rotation[2];
    angle = rotation[0] == undef ? 0 : rotation[0];
    translate([u_mm(xpos - xoff), u_mm(ypos - yoff), 0])
      rotate(angle)
        translate([u_mm(xoff), u_mm(yoff), 0])
          children();
  }
}

module switch(type, style="mx", rgb=true, xpos=0, ypos=0, width=1, cnc=false, rotation=[0,0,0], connections=["hole","hole","hole","hole"], last_xpos=0, last_ypos=0) {
  rotate_translate(rotation, xpos, ypos) {
    if(type == "outline")
      pcb_switch_outline(width=width);
    if(style == "mx") {
      if(type == "key")
        pcb_switch_space_outline(width=width, cnc=cnc, style="mx");
      if(type == "traces")
        switch_mx_pcb_traces(width=width, rgb=rgb, xpos=xpos, ypos=ypos, connections=connections, last_xpos=last_xpos, last_ypos=last_ypos);
      if(type == "traces_top")
        switch_mx_pcb_traces(width=width, single=false, rgb=rgb, xpos=xpos, ypos=ypos, connections=connections, last_xpos=last_xpos, last_ypos=last_ypos);
      if(type == "traces_bottom")
        switch_mx_pcb_traces_bottom(width=width, rgb=rgb, xpos=xpos, ypos=ypos, connections=connections, last_xpos=last_xpos, last_ypos=last_ypos);
      if(type == "drill")
        switch_mx_pcb_drill(width=width, rgb=rgb, connections=connections);
      if(type == "drill_double")
        switch_mx_pcb_drill(width=width, single=false, rgb=rgb, connections=connections);
    }

    if(style == "choc_v1") {
      if(type == "key")
        pcb_switch_space_outline(width=width, cnc=cnc, style="choc_v1");
      if(type == "traces")
        switch_choc_v1_pcb_traces(width=width);
      if(type == "traces_top")
        switch_choc_v1_pcb_traces(width=width);
      if(type == "traces_bottom")
        assert(false, "traces_bottom is incompatible with choc_v1");
      if(type == "drill")
        switch_choc_v1_pcb_drill(width=width);
      if(type == "drill_double")
        switch_choc_v1_pcb_drill(width=width, single=false);
    }

    if(style == "redragon") {
      if(type == "key")
        pcb_switch_space_outline(width=width, cnc=cnc, style="redragon");
      if(type == "traces")
        switch_mx_pcb_traces(width=width, rgb=rgb);
      if(type == "traces_top")
        switch_mx_pcb_traces(width=width, single=false, rgb=rgb);
      if(type == "traces_bottom")
        switch_mx_pcb_traces_bottom(width=width, rgb=rgb);
      if(type == "traces")
        switch_mx_pcb_traces(width=width, rgb=rgb);
      if(type == "drill")
        switch_mx_pcb_drill(width=width);
      if(type == "drill_double")
        switch_mx_pcb_drill(width=width, single=false);
    }
  }
}

module switch_row(keys, style="mx", rgb=true, margin=5, thickness=10, depth=0, cnc=false, type="key", last_row=[], last_xpos=0, previous_xpos=0, last_ypos=0, previous_ypos=0) {
  width = keys[0][0] == undef ? 1 : keys[0][0];
  xpos = keys[0][1] == undef ? 0 : keys[0][1];
  ypos = keys[0][2] == undef ? 0 : keys[0][2];
  rotation = keys[0][3] == undef ? [0,0,0] : keys[0][3];
  connections = keys[0][4] == undef ? ["hole","hole","hole","hole"] : keys[0][4];
  last_ypos = last_row[0][2] == undef ? last_ypos - previous_ypos : last_row[0][2]+last_ypos - previous_ypos;
  last_xpos = last_row[0][1] == undef ? last_xpos - previous_xpos : last_row[0][1]+last_xpos - previous_xpos;
  switch(type, style=style, rgb=rgb, xpos=xpos, ypos=ypos, width=width, cnc=cnc, rotation=rotation, connections=connections, last_xpos=last_xpos, last_ypos=last_ypos);
  if(len(keys) > 1) {
    translate([xpos*key_size+width*key_size, ypos*key_size, 0])
      switch_row(pop(keys), style=style, rgb=rgb, margin=margin, thickness=thickness, depth=depth, cnc=cnc, type=type, last_row = pop(last_row), last_xpos=last_xpos, previous_xpos=xpos, last_ypos=last_ypos, previous_ypos=ypos);
  }
}

module switches(switches, style="mx", rgb=true, margin=5, thickness=10, depth=0, cnc=false, type="key", last_row=[]) {
  if(len(switches) != 0) {
    switch_row(switches[0], style=style, rgb=rgb, margin=margin, thickness=thickness, depth=depth, cnc=cnc, type=type, last_row=last_row);
    if(len(switches) > 1) {
      last_row = switches[0];
      translate([0, key_size, 0])
        switches(pop(switches), style=style, rgb=rgb, margin=margin, depth=depth, thickness=thickness, cnc=cnc, type=type, last_row=last_row);
    }
  }
}
// file: ../lib/variables.scad
key_size=19.05;
hole=14;

function u_mm(u) = u*key_size;
function hole_offset(u) = (key_size-hole)/2+u_mm(u-1)/2;

// This is used to determine how much space is between the top
// of the plate and the PCB.
function height_for_style(style) = style == "mx"        ? 5.334 :
                                   style == "redragon" ? 3.75  :
                                   style == "choc_v1"   ? 2.2   :  "invalid style";
// file: ../lib/case.scad
include <variables.scad>
use <utilities.scad>
use <circuits.scad>

function key_width(key) = (key[0] == undef ? 1 : key[0]) + (key[1] == undef ? 0 : key[1]);
function width_row(row) = len(row) == 0 ? 0 : key_width(row[0]) + width_row(pop(row));
function width_board(rows) = len(rows) == 0 ? 0 : (
  let (current = width_row(rows[0]))
  let (next = width_board(pop(rows)))
    current > next ? current : next);

function key_height(key) = (key[2] == undef ? 0 : key[2]);
function height_row(row) = len(row) == 0 ? [0,0] : (
  let(other_rows = height_row(pop(row)))
  let(current = key_height(row[0]) + other_rows[0])
  let(maximum = current > other_rows[1] ? current : other_rows[1])
  [current, maximum]);
function height_board_rec(rows) = len(rows) == 0 ? 0 : (
  let (current = height_row(reverse(rows[0]))[1])
  let (next = height_board_rec(pop(rows)))
    current > next ? current : next);
function height_board(rows) = 
  let (height_rec = height_board_rec(rows))
    len(rows) + (height_rec > 0 ? height_rec : 0);

module case(rows, style="mx", margin=5, thickness=5, depth=0, radius=2, rest=0, circuits=[], _inherit_children="unset") {
  total_thickness = thickness + depth + height_for_style(style);
  z_offset = depth + height_for_style(style);
  if($children != 0 && (_inherit_children == "unset" || _inherit_children > 0)) {
    translate([0, 0, -z_offset])
      linear_extrude(total_thickness)
        offset(margin)
          children();
  } else {
    width=u_mm(width_board(rows))+margin*2;
    height=u_mm(height_board(rows))+margin*2+rest;
    translate([-margin, -margin, -z_offset]){
      translate([radius, 0, 0])
        cube([width-radius*2, height,total_thickness]);
      translate([0, radius, 0])
        cube([width, height-radius*2,total_thickness]);
      translate([radius, radius, 0])
        cylinder(total_thickness,radius,radius, $fn=60);
      translate([width-radius, radius, 0])
        cylinder(total_thickness,radius,radius, $fn=60);
      translate([width-radius, height-radius, 0])
        cylinder(total_thickness,radius,radius, $fn=60);
      translate([radius, height-radius, 0])
        cylinder(total_thickness,radius,radius, $fn=60);
    }
    if(len(circuits) > 0)
      translate([0, 0, -z_offset])
        linear_extrude(total_thickness)
          offset(margin)
            circuits_pcb_outline(circuits);
  }
}
// main file
use <../keyboard.scad>
use <../lib/case.scad>

layout = [
  [[1,0,0.5],[],[1,0,-0.25],[1,0,-0.25],[1,0,0.25],[1,0,0.25]],
  [[1,0,0.5],[],[1,0,-0.25],[1,0,-0.25],[1,0,0.25],[1,0,0.25]],
  [[1,0,0.5],[],[1,0,-0.25],[1,0,-0.25],[1,0,0.25],[1,0,0.25]],
  [[1,3.5,0.285],[1,0,0],[1.5,0,0]]
];

top_plate(layout, cnc=false);
